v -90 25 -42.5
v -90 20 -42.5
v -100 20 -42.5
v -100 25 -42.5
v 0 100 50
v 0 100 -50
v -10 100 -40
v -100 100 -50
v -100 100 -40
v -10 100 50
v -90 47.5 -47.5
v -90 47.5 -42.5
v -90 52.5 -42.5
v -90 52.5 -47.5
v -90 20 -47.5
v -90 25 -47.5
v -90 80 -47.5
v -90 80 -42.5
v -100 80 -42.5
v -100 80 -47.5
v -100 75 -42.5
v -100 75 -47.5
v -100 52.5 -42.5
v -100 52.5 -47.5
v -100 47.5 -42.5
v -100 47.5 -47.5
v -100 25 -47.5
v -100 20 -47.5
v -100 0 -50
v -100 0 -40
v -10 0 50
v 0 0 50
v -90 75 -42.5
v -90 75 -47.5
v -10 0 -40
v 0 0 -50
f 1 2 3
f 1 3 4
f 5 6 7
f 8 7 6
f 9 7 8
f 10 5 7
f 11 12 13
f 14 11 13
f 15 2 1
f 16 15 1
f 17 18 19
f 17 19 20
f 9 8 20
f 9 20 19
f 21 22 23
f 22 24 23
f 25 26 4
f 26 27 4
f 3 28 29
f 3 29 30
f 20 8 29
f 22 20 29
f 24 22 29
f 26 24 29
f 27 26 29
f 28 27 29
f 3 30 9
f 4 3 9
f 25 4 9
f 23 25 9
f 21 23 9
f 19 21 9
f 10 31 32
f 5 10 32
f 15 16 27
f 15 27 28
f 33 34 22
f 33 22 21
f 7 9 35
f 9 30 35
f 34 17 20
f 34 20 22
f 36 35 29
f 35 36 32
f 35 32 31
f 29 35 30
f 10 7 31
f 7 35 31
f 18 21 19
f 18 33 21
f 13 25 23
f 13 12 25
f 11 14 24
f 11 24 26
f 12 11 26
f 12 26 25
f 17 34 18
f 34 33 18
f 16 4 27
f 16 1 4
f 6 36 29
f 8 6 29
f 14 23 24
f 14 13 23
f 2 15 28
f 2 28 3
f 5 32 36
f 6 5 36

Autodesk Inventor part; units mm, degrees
ref_plane "YZ Plane" through (0, 0, 0) normal (1, 0, 0) x (0, 1, 0)
ref_plane "XZ Plane" through (0, 0, 0) normal (0, 1, 0) x (-1, 0, 0)
ref_plane "XY Plane" through (0, 0, 0) normal (0, 0, 1) x (1, 0, 0)
sketch "Sketch1" plane through (0, 0, 0) normal (0, 1, 0) x (-1, 0, 0)
  line L0 (400, -50) -> (400, 50)
  line L1 (400, 50) -> (390, 50)
  line L2 (390, 50) -> (390, -40)
  line L3 (390, -40) -> (300, -40)
  line L4 (300, -40) -> (300, -50)
  line L5 (300, -50) -> (400, -50)
  line L6 (250, -50) -> (250, -40)
  line L7 (250, -40) -> (150, -40)
  line L8 (150, -40) -> (150, -50)
  line L9 (150, -50) -> (250, -50)
  line L10 (100, -50) -> (100, -40)
  line L11 (100, -40) -> (10, -40)
  line L12 (10, -40) -> (10, 50)
  line L13 (10, 50) -> (0, 50)
  line L14 (0, 50) -> (0, -50)
  line L15 (0, -50) -> (100, -50)
  point P0 (0, 0)
  dimension "d0" = 100
  dimension "d1" = 100
  dimension "d2" = 10
  dimension "d3" = 10
  dimension "d4" = 100
  dimension "d5" = 100
  dimension "d6" = 100
  dimension "d7" = 10
  dimension "d8" = 10
  dimension "d9" = 50
  dimension "d10" = 50
  dimension "d11" = 400
  dimension "d12" = 50
  dimension "d13" = 50
extrude "Extrusion1" add sketch "Sketch1" along normal blind 100
sketch "Sketch2" plane through (0, 0, 0) normal (1, 0, 0) x (0, 1, 0)
  point P0 (0, 0)
sketch "Sketch3" plane through (0, 0, 50) normal (1, 0, 0) x (0, 0, -1)
  line L0 (92.5, 80) -> (97.5, 80)
  line L1 (97.5, 80) -> (97.5, 75)
  line L2 (97.5, 75) -> (92.5, 75)
  line L3 (92.5, 75) -> (92.5, 80)
  line L4 (97.5, 20) -> (92.5, 20)
  line L5 (92.5, 20) -> (92.5, 25)
  line L6 (92.5, 25) -> (97.5, 25)
  line L7 (97.5, 25) -> (97.5, 20)
  line L8 (0, 100) -> (100, 100) projected
  line L9 (100, 0) -> (100, 100) projected
  line L10 (0, 0) -> (100, 0) projected
  line L11 (92.5, 52.5) -> (97.5, 52.5)
  line L12 (97.5, 52.5) -> (97.5, 47.5)
  line L13 (97.5, 47.5) -> (92.5, 47.5)
  line L14 (92.5, 47.5) -> (92.5, 52.5)
  point P0 (50, 0)
  dimension "d16" = 20
  dimension "d17" = 5
  dimension "d18" = 5
  dimension "d19" = 2.5
  dimension "d20" = 20
  dimension "d21" = 5
  dimension "d22" = 5
  dimension "d24" = 7.5
  dimension "d25" = 5
  dimension "d26" = 5
  dimension "d27" = 2.5
  dimension "d28" = 22.5
extrude "Extrusion2" cut sketch "Sketch3" against normal blind 320
sketch "Sketch4" plane through (0, 0, 50) normal (1, 0, 0) x (0, 0, -1)
  line L0 (97.5, 75) -> (92.5, 75) projected
  line L1 (97.5, 80) -> (97.5, 75) projected
  line L2 (92.5, 80) -> (97.5, 80) projected
  line L3 (92.5, 75) -> (92.5, 80) projected
  line L4 (97.5, 47.5) -> (92.5, 47.5) projected
  line L5 (97.5, 52.5) -> (97.5, 47.5) projected
  line L6 (92.5, 52.5) -> (97.5, 52.5) projected
  line L7 (92.5, 47.5) -> (92.5, 52.5) projected
  line L8 (92.5, 25) -> (97.5, 25) projected
  line L9 (92.5, 20) -> (92.5, 25) projected
  line L10 (97.5, 20) -> (92.5, 20) projected
  line L11 (97.5, 25) -> (97.5, 20) projected
  line L12 (92.5, 80) -> (97.5, 80)
  line L13 (97.5, 80) -> (97.5, 75)
  line L14 (97.5, 75) -> (92.5, 75)
  line L15 (92.5, 75) -> (92.5, 80)
  line L16 (92.5, 52.5) -> (97.5, 52.5)
  line L17 (97.5, 52.5) -> (97.5, 47.5)
  line L18 (97.5, 47.5) -> (92.5, 47.5)
  line L19 (92.5, 47.5) -> (92.5, 52.5)
  line L20 (92.5, 25) -> (97.5, 25)
  line L21 (97.5, 25) -> (97.5, 20)
  line L22 (97.5, 20) -> (92.5, 20)
  line L23 (92.5, 20) -> (92.5, 25)
  point P0 (50, 0)
extrude "Extrusion3" add sketch "Sketch4" against normal blind 80
sketch "Sketch6" plane through (-250, 0, -40) normal (0, 0, 1) x (1, 0, 0)
  line L0 (-50, 80) -> (-50, 75) projected
  line L1 (-50, 80) -> (-70, 80) projected
  line L2 (-70, 80) -> (-70, 75) projected
  line L3 (-50, 75) -> (-70, 75) projected
  line L4 (-50, 52.5) -> (-50, 47.5) projected
  line L5 (-50, 52.5) -> (-70, 52.5) projected
  line L6 (-70, 52.5) -> (-70, 47.5) projected
  line L7 (-50, 47.5) -> (-70, 47.5) projected
  line L8 (-50, 25) -> (-50, 20) projected
  line L9 (-50, 25) -> (-70, 25) projected
  line L10 (-70, 25) -> (-70, 20) projected
  line L11 (-50, 20) -> (-70, 20) projected
  line L12 (0, 75) -> (0, 80) projected
  line L13 (100, 75) -> (0, 75) projected
  line L14 (100, 80) -> (100, 75) projected
  line L15 (100, 80) -> (0, 80) projected
  line L16 (0, 47.5) -> (0, 52.5) projected
  line L17 (100, 47.5) -> (0, 47.5) projected
  line L18 (100, 52.5) -> (100, 47.5) projected
  line L19 (100, 52.5) -> (0, 52.5) projected
  line L20 (0, 20) -> (0, 25) projected
  line L21 (100, 20) -> (0, 20) projected
  line L22 (100, 25) -> (100, 20) projected
  line L23 (100, 25) -> (0, 25) projected
  line L24 (170, 75) -> (170, 80) projected
  line L25 (170, 80) -> (150, 80) projected
  line L26 (150, 75) -> (150, 80) projected
  line L27 (170, 75) -> (150, 75) projected
  line L28 (170, 47.5) -> (170, 52.5) projected
  line L29 (170, 52.5) -> (150, 52.5) projected
  line L30 (150, 47.5) -> (150, 52.5) projected
  line L31 (170, 47.5) -> (150, 47.5) projected
  line L32 (170, 20) -> (170, 25) projected
  line L33 (170, 25) -> (150, 25) projected
  line L34 (150, 20) -> (150, 25) projected
  line L35 (170, 20) -> (150, 20) projected
  line L36 (-70, 80) -> (-60, 80)
  line L37 (-60, 80) -> (-60, 20)
  line L38 (-60, 20) -> (-70, 20)
  line L39 (-70, 20) -> (-70, 80)
  line L40 (10, 80) -> (90, 80)
  line L41 (90, 80) -> (90, 20)
  line L42 (90, 20) -> (10, 20)
  line L43 (10, 20) -> (10, 80)
  line L44 (160, 80) -> (170, 80)
  line L45 (170, 80) -> (170, 20)
  line L46 (170, 20) -> (160, 20)
  line L47 (160, 20) -> (160, 80)
  line L48 (0, 0) -> (0, 100) projected
  line L49 (100, 0) -> (100, 100) projected
  line L50 (10, 25) -> (90, 25)
  line L51 (90, 25) -> (90, 20)
  line L52 (90, 20) -> (10, 20)
  line L53 (10, 20) -> (10, 25)
  point P0 (250, 0)
  point P1 (160, 25)
  point P2 (160, 20)
  point P3 (160, 52.5)
  point P4 (160, 47.5)
  point P5 (160, 75)
  point P6 (10, 75)
  point P7 (90, 75)
  point P8 (90, 80)
  point P9 (10, 52.5)
  point P10 (10, 47.5)
  point P11 (90, 47.5)
  point P12 (90, 52.5)
  point P13 (10, 25)
  point P14 (10, 20)
  point P15 (-60, 25)
  point P16 (-60, 47.5)
  point P17 (-60, 52.5)
  point P18 (-60, 75)
  point P19 (90, 25)
  point P20 (90, 25)
  dimension "d33" = 10
  dimension "d34" = 10
extrude "Extrusion4" add sketch "Sketch6" against normal blind 10 contours L37 L3 L2 L1 | L37 L5 L39 L3 | L37 L7 L6 L5 | L37 L9 L39 L7 | L37 L11 L10 L9 | L43 L15 L41 L13 | L19 L41 L17 L43 | L23 L41 L21 L43 | L27 L47 L25 L24 | L45 L29 L47 L27 | L28 L31 L47 L29 | L45 L33 L47 L31 | L32 L35 L47 L33
sketch "Sketch8" plane through (0, 100, 0) normal (0, 1, 0) x (1, 0, 0)
  line L0 (-300, 50) -> (-400, 50) projected
  line L1 (-400, 50) -> (-400, -50) projected
  line L2 (-150, 40) -> (-150, 50) projected
  line L3 (-400, 50) -> (-150, 50)
  line L4 (-150, 50) -> (-150, -50)
  line L5 (-150, -50) -> (-400, -50)
  line L6 (-400, -50) -> (-400, 50)
  point P0 (0, 0)
  dimension "d44" = 250
  dimension "d45" = 100
extrude "Extrusion6" cut sketch "Sketch8" against normal through all
properties part number "Soccer Goal Split"
